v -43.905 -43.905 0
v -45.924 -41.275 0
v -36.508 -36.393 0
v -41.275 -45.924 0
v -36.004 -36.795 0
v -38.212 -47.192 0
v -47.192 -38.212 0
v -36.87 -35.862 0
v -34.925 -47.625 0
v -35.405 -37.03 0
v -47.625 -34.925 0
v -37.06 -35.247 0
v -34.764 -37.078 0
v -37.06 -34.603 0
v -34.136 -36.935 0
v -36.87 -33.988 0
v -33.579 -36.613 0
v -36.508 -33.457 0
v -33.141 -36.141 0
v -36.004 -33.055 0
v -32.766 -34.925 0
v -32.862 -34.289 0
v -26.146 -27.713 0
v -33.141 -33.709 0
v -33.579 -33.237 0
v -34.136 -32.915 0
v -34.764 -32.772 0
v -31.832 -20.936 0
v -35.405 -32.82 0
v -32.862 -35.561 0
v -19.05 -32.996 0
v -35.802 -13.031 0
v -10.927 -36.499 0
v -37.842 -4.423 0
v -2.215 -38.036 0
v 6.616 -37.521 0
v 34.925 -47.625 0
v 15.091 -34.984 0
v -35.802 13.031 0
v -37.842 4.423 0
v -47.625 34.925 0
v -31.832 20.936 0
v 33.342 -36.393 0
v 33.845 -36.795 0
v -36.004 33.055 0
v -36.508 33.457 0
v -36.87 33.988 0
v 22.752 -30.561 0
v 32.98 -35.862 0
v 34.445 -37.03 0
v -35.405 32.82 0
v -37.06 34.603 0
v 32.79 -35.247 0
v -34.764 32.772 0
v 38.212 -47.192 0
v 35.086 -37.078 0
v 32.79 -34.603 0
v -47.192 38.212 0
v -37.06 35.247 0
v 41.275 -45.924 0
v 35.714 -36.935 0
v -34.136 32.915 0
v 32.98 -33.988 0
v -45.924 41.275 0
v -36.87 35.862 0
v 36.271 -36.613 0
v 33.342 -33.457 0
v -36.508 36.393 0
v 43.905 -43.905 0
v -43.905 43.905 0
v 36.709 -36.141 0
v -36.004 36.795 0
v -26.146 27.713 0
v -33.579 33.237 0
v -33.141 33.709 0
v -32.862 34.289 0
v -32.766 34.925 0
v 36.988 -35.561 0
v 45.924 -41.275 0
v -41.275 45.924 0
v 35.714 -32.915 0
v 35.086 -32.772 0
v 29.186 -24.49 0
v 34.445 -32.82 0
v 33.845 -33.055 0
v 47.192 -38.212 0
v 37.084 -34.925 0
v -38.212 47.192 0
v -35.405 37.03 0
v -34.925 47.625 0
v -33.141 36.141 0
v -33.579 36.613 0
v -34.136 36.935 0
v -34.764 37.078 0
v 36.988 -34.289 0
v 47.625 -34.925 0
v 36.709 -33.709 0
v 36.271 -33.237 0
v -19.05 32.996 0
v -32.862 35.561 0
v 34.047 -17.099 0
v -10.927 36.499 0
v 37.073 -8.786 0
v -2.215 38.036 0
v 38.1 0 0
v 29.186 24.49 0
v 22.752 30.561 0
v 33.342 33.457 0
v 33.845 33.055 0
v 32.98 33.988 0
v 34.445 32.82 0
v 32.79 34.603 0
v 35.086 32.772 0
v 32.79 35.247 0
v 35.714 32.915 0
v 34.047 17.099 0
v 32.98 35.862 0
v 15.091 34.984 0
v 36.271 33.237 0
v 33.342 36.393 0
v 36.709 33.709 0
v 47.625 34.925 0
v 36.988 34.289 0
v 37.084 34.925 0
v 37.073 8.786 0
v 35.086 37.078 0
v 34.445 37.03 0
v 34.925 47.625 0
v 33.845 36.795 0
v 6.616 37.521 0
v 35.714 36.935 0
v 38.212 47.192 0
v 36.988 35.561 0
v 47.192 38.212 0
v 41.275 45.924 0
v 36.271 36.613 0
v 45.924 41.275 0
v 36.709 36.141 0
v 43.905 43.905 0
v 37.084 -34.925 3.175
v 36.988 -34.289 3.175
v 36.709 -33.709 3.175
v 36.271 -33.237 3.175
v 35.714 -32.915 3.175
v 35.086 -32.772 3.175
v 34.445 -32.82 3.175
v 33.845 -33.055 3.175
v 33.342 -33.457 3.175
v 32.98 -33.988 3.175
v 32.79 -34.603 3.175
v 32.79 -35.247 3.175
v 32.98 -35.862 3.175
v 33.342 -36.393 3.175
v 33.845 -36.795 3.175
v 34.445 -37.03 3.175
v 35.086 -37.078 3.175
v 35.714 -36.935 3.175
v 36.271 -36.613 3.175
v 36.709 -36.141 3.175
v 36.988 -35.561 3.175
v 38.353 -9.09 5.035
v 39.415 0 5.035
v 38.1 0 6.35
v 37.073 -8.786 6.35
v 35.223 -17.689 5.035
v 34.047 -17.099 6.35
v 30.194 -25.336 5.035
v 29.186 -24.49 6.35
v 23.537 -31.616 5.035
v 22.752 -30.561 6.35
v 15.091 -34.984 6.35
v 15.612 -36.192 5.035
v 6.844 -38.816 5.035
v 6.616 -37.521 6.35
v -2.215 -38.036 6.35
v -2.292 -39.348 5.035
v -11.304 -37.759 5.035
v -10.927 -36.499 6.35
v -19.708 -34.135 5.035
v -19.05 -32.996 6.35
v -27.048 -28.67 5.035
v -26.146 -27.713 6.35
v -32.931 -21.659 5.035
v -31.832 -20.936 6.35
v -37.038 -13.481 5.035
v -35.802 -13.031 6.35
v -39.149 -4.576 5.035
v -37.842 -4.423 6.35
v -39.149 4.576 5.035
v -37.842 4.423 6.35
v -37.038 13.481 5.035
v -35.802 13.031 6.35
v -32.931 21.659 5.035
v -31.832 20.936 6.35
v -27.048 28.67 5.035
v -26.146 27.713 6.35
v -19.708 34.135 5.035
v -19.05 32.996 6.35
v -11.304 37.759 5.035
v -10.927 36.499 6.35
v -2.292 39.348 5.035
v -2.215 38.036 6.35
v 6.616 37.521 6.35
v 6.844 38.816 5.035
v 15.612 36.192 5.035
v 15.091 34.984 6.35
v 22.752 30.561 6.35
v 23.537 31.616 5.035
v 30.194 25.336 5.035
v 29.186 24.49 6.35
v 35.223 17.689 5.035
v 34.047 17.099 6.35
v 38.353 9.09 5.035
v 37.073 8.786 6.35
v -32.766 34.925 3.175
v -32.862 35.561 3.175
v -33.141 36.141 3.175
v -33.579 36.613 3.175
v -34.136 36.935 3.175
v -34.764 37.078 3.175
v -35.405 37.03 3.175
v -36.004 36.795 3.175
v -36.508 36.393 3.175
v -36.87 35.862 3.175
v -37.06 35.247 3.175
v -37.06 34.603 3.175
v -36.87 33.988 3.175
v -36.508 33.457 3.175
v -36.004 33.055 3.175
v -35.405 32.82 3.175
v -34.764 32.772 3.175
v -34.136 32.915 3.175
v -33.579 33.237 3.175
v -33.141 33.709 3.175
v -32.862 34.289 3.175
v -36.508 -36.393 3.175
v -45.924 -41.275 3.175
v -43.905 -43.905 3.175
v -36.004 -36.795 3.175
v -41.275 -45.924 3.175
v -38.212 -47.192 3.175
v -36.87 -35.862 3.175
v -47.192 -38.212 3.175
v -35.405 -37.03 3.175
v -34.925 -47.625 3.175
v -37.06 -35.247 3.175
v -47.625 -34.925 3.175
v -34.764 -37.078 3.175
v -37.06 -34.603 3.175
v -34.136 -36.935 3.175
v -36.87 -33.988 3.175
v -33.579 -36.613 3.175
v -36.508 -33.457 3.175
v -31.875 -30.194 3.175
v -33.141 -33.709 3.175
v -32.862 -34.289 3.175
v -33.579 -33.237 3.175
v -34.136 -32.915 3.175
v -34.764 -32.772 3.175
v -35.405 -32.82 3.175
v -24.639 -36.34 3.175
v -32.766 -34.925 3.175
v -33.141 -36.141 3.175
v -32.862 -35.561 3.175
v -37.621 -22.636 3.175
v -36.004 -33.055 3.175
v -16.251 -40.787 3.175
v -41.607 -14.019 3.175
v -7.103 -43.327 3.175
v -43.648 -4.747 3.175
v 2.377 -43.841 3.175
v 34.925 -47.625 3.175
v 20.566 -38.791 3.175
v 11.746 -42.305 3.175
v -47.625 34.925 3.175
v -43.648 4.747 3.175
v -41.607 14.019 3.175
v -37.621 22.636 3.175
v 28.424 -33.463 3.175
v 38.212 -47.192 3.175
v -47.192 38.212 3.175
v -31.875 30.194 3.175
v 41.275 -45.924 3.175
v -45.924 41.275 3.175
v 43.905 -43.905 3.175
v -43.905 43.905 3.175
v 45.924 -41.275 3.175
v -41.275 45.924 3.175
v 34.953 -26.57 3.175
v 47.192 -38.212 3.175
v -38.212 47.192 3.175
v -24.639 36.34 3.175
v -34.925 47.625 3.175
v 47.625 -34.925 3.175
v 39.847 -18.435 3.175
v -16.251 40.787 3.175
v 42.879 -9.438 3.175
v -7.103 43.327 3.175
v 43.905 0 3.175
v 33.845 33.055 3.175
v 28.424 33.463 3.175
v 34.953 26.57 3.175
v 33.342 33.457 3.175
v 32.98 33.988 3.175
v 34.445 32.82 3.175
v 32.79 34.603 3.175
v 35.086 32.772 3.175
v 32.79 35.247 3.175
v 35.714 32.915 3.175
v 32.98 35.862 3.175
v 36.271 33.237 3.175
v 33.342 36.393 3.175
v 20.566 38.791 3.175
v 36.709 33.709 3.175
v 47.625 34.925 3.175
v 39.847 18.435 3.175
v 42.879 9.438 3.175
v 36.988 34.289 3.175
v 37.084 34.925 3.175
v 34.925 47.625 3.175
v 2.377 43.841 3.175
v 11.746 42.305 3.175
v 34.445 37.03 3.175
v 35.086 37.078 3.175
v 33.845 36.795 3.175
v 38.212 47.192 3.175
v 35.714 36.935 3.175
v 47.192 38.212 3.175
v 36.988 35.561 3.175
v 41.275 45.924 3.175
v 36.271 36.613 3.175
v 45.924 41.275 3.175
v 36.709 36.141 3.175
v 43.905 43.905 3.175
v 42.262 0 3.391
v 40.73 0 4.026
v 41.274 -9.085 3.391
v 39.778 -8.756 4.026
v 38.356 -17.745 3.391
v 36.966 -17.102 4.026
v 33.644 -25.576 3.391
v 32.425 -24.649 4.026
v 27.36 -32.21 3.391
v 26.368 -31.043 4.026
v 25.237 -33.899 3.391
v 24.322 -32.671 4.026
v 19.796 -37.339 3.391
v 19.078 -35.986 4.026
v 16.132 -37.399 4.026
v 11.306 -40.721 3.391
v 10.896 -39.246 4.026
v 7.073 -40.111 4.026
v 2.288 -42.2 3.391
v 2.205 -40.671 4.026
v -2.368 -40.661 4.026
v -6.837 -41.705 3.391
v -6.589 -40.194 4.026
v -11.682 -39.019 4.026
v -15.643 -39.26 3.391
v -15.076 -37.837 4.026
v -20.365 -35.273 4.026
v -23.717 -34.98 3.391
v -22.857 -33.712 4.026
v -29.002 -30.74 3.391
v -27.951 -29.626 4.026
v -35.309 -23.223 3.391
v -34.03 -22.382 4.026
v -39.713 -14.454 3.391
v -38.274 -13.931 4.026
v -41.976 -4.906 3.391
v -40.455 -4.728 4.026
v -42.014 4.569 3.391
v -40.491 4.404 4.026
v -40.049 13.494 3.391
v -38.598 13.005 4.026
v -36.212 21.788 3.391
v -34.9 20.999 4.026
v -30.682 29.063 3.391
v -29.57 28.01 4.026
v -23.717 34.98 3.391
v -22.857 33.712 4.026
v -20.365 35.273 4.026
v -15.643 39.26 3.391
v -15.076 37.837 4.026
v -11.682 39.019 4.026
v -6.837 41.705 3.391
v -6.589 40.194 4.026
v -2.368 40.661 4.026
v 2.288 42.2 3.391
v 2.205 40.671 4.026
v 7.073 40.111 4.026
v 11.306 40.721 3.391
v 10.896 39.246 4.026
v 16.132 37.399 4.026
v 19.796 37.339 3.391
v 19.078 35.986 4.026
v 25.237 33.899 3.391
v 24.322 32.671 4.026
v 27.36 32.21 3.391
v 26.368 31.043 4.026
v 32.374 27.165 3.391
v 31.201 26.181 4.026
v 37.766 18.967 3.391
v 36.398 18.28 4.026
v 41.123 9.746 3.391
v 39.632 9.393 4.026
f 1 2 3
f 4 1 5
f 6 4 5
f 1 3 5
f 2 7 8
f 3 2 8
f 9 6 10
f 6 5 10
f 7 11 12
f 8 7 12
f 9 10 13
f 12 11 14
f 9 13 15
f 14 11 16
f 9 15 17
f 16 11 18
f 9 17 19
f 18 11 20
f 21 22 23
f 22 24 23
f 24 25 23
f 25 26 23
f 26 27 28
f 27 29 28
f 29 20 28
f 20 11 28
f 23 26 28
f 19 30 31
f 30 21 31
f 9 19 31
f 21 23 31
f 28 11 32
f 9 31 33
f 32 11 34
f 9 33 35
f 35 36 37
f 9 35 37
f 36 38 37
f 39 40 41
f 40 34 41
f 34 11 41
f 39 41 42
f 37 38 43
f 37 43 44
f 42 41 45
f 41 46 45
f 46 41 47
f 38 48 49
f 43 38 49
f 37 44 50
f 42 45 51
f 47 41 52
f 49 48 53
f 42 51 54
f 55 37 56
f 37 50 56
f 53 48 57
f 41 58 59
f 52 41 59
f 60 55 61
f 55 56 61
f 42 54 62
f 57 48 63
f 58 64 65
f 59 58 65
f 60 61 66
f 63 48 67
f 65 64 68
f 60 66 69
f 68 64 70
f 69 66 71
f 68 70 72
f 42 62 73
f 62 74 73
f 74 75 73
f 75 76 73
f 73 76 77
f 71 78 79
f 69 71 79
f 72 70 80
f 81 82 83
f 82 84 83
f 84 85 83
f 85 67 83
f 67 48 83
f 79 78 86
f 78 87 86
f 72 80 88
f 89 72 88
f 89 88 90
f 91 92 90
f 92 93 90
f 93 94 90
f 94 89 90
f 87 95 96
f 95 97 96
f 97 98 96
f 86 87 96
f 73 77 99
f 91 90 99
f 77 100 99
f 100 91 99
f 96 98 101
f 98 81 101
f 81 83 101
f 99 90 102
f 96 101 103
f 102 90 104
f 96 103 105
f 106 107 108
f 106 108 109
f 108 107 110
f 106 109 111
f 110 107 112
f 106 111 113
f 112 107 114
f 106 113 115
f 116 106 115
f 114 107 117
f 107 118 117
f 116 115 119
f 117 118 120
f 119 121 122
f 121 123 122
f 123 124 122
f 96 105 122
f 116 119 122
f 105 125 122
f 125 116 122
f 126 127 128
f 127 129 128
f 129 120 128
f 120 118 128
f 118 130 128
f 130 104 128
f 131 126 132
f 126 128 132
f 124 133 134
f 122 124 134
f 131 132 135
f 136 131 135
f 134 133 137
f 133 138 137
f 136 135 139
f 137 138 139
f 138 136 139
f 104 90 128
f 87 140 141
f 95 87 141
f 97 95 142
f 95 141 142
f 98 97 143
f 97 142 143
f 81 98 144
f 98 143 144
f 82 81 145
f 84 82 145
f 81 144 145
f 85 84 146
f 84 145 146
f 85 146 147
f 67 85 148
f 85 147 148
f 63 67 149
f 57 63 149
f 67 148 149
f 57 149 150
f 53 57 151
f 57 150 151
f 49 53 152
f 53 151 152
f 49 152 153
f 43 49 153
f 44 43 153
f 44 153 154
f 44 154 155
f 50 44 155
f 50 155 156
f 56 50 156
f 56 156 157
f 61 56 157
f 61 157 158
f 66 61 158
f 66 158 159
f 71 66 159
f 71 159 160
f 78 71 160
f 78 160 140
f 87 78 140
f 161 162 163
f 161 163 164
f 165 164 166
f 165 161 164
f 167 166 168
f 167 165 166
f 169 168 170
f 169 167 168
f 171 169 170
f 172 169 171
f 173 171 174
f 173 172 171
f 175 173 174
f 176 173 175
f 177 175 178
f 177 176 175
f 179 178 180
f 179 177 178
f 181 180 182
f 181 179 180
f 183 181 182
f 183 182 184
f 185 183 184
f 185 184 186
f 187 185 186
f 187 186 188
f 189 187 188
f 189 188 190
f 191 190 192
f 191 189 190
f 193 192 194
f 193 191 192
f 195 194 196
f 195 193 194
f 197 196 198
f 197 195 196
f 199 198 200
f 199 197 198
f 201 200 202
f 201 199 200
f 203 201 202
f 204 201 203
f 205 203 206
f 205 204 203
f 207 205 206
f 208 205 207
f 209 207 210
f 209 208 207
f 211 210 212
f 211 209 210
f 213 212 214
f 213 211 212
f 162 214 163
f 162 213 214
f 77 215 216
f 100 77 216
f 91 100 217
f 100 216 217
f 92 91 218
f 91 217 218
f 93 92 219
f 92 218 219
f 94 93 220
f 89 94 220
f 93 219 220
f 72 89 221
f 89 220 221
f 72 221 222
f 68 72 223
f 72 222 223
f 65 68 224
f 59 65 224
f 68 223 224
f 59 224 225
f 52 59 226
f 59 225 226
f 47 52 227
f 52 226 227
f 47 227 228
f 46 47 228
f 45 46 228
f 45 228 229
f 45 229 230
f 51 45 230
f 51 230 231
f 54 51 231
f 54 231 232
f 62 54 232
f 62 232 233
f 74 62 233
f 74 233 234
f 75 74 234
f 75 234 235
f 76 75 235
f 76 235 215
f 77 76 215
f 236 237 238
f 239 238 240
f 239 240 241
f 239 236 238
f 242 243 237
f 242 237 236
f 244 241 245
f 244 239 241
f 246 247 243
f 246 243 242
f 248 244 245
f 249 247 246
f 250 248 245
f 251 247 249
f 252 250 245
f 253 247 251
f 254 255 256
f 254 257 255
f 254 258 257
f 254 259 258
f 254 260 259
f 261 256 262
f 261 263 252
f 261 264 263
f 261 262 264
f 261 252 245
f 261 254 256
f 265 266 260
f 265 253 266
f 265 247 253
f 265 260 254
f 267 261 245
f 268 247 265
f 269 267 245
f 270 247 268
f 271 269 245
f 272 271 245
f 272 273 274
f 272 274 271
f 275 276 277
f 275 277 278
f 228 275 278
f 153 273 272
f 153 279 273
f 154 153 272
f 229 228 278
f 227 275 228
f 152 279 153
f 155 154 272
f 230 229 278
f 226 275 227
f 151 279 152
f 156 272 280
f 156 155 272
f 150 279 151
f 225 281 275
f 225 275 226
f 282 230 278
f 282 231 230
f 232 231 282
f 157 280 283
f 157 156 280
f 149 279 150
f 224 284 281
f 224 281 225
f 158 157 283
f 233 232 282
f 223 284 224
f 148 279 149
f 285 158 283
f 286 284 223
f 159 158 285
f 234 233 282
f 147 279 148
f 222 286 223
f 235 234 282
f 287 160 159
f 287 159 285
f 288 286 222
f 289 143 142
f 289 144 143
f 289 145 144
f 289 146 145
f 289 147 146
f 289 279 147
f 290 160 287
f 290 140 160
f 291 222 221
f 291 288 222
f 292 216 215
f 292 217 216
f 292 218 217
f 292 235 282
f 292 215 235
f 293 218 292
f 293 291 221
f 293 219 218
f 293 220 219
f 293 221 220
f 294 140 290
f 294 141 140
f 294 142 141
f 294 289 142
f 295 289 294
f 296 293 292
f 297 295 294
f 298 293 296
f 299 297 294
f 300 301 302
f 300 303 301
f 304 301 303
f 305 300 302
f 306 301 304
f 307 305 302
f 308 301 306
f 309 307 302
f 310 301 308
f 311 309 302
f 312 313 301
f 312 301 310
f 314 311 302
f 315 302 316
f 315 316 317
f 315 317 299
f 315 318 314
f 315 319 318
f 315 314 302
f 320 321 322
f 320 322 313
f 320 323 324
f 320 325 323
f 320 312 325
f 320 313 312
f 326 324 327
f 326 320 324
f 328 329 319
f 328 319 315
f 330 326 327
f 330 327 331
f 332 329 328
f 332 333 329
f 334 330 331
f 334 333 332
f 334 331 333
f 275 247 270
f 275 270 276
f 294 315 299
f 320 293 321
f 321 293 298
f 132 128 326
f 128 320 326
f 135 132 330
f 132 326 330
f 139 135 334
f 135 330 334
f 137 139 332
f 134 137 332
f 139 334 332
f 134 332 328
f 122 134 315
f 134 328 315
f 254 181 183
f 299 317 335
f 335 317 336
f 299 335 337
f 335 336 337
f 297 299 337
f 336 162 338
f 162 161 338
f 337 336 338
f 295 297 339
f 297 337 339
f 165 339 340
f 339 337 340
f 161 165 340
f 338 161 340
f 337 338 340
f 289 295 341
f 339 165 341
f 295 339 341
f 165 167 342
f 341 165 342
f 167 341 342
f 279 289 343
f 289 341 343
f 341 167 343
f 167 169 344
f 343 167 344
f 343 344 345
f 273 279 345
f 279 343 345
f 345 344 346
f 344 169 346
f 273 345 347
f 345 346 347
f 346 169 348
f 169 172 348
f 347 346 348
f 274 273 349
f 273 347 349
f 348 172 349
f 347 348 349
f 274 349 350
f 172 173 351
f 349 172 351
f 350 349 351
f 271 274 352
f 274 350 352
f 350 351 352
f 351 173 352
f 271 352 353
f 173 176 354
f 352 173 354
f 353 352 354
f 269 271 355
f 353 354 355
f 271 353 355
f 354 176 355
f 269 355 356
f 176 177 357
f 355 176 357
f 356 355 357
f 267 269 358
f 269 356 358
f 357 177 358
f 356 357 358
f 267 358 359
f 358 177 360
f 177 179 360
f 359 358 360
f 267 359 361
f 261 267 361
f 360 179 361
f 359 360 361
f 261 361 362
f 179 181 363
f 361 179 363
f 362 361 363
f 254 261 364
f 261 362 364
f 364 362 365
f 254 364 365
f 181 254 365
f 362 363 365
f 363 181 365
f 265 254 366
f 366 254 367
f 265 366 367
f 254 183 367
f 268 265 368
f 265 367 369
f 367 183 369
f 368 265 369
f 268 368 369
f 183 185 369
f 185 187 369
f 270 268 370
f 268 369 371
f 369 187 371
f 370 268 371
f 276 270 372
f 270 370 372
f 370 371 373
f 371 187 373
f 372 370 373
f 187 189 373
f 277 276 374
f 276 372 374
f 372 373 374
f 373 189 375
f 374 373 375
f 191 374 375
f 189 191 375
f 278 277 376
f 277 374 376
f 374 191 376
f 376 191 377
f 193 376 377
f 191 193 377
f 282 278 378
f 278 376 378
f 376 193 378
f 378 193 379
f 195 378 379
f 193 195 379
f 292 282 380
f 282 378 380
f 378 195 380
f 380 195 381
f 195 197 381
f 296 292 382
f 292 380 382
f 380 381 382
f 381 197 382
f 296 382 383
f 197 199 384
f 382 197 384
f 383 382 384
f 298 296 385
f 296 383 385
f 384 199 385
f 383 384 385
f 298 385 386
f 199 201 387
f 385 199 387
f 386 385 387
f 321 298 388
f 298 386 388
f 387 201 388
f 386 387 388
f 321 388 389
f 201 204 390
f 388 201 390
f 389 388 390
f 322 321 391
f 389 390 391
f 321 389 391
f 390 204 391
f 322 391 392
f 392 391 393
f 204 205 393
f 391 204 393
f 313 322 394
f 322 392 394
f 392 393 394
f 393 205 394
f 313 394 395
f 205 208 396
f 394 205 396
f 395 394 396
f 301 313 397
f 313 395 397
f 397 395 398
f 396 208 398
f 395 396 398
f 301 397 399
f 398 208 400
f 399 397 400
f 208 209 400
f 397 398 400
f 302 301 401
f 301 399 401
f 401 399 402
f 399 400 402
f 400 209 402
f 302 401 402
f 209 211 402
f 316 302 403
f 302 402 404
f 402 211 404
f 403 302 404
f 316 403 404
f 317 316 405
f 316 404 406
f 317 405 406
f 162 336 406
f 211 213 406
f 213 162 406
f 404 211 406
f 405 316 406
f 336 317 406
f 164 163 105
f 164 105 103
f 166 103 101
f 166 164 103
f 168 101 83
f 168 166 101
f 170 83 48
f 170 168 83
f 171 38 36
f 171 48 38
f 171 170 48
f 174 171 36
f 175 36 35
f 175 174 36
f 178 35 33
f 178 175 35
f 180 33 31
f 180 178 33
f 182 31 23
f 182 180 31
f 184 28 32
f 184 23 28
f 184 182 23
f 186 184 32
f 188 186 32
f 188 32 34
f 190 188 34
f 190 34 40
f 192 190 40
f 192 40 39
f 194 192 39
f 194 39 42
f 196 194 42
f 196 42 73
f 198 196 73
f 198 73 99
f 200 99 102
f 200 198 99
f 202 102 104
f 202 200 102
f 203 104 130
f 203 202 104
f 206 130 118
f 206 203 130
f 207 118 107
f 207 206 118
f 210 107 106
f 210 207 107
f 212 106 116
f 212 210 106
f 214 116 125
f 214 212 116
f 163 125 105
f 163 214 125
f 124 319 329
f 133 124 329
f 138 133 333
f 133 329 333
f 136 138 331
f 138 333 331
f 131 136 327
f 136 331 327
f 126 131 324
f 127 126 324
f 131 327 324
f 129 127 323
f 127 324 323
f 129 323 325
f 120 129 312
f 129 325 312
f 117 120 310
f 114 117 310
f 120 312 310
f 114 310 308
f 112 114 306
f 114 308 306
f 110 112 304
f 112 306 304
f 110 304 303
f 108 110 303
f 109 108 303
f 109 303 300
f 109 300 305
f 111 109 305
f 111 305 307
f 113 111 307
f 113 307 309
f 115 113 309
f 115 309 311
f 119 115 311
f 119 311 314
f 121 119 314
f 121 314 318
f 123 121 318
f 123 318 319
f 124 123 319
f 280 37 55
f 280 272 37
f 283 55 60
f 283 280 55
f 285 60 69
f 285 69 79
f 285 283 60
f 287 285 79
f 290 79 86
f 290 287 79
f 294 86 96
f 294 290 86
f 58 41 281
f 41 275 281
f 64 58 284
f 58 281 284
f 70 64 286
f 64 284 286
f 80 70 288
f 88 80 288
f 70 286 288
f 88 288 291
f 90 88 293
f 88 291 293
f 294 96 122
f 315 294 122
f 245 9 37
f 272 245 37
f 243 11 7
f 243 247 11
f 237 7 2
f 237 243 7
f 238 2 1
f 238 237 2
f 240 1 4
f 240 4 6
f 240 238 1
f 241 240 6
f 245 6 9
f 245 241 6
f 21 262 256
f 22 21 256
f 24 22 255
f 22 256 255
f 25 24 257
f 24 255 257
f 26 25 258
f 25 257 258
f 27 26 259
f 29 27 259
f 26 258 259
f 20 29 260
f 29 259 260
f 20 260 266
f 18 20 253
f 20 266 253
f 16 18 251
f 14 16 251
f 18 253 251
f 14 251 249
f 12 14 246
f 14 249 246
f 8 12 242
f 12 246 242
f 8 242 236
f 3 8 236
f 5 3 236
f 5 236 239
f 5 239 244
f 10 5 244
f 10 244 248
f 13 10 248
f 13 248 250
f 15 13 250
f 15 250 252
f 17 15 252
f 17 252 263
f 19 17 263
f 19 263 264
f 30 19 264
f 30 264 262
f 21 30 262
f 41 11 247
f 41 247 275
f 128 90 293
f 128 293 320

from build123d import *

# Parameters (mm, degrees)
SKETCH1_W           = 95.25
SKETCH1_H           = 95.25
SKETCH1_R           = 38.1
BOSS_EXTRUDE1_DEPTH = 3.175
FILLET1_R           = 6.35
SKETCH4_R           = 2.159
CUT_EXTRUDE1_DEPTH  = 4.175
FILLET2_R           = 12.7


with BuildPart() as part:
    # Sketch1 → Boss-Extrude1 (new body)
    with BuildSketch(Plane.XY):
        Rectangle(SKETCH1_W, SKETCH1_H)
        Circle(SKETCH1_R, mode=Mode.SUBTRACT)
    extrude(amount=BOSS_EXTRUDE1_DEPTH)

    # Sketch2 → Revolve1 (revolve)
    with BuildSketch(Plane(origin=(0, 0, 0), x_dir=(1, 0, 0), z_dir=(0, 1, 0))):
        Polygon((38.1, -3.175), (38.1, -6.35), (41.275, -3.175), align=None)
    revolve(axis=Axis((0, 0, 1000), (0, 0, -1)))

    # Fillet1
    fillet1_edges = [part.edges().sort_by_distance(p)[0] for p in [
        (-41.275, 0, 3.175),
    ]]
    fillet(fillet1_edges, radius=FILLET1_R)

    # Sketch4 → Cut-Extrude1 (cut, through all)
    with BuildSketch(Plane.XY.offset(3.175)):
        with Locations((-34.925, 34.925)):
            Circle(SKETCH4_R)
        with Locations((34.925, 34.925)):
            Circle(SKETCH4_R)
        with Locations((34.925, -34.925)):
            Circle(SKETCH4_R)
        with Locations((-34.925, -34.925)):
            Circle(SKETCH4_R)
    extrude(amount=-CUT_EXTRUDE1_DEPTH, mode=Mode.SUBTRACT)

    # Fillet2
    fillet2_edges = [part.edges().sort_by_distance(p)[0] for p in [
        (-47.625, 47.625, 1.5875),
        (47.625, 47.625, 1.5875),
        (47.625, -47.625, 1.5875),
        (-47.625, -47.625, 1.5875),
    ]]
    fillet(fillet2_edges, radius=FILLET2_R)


solid = part.part
